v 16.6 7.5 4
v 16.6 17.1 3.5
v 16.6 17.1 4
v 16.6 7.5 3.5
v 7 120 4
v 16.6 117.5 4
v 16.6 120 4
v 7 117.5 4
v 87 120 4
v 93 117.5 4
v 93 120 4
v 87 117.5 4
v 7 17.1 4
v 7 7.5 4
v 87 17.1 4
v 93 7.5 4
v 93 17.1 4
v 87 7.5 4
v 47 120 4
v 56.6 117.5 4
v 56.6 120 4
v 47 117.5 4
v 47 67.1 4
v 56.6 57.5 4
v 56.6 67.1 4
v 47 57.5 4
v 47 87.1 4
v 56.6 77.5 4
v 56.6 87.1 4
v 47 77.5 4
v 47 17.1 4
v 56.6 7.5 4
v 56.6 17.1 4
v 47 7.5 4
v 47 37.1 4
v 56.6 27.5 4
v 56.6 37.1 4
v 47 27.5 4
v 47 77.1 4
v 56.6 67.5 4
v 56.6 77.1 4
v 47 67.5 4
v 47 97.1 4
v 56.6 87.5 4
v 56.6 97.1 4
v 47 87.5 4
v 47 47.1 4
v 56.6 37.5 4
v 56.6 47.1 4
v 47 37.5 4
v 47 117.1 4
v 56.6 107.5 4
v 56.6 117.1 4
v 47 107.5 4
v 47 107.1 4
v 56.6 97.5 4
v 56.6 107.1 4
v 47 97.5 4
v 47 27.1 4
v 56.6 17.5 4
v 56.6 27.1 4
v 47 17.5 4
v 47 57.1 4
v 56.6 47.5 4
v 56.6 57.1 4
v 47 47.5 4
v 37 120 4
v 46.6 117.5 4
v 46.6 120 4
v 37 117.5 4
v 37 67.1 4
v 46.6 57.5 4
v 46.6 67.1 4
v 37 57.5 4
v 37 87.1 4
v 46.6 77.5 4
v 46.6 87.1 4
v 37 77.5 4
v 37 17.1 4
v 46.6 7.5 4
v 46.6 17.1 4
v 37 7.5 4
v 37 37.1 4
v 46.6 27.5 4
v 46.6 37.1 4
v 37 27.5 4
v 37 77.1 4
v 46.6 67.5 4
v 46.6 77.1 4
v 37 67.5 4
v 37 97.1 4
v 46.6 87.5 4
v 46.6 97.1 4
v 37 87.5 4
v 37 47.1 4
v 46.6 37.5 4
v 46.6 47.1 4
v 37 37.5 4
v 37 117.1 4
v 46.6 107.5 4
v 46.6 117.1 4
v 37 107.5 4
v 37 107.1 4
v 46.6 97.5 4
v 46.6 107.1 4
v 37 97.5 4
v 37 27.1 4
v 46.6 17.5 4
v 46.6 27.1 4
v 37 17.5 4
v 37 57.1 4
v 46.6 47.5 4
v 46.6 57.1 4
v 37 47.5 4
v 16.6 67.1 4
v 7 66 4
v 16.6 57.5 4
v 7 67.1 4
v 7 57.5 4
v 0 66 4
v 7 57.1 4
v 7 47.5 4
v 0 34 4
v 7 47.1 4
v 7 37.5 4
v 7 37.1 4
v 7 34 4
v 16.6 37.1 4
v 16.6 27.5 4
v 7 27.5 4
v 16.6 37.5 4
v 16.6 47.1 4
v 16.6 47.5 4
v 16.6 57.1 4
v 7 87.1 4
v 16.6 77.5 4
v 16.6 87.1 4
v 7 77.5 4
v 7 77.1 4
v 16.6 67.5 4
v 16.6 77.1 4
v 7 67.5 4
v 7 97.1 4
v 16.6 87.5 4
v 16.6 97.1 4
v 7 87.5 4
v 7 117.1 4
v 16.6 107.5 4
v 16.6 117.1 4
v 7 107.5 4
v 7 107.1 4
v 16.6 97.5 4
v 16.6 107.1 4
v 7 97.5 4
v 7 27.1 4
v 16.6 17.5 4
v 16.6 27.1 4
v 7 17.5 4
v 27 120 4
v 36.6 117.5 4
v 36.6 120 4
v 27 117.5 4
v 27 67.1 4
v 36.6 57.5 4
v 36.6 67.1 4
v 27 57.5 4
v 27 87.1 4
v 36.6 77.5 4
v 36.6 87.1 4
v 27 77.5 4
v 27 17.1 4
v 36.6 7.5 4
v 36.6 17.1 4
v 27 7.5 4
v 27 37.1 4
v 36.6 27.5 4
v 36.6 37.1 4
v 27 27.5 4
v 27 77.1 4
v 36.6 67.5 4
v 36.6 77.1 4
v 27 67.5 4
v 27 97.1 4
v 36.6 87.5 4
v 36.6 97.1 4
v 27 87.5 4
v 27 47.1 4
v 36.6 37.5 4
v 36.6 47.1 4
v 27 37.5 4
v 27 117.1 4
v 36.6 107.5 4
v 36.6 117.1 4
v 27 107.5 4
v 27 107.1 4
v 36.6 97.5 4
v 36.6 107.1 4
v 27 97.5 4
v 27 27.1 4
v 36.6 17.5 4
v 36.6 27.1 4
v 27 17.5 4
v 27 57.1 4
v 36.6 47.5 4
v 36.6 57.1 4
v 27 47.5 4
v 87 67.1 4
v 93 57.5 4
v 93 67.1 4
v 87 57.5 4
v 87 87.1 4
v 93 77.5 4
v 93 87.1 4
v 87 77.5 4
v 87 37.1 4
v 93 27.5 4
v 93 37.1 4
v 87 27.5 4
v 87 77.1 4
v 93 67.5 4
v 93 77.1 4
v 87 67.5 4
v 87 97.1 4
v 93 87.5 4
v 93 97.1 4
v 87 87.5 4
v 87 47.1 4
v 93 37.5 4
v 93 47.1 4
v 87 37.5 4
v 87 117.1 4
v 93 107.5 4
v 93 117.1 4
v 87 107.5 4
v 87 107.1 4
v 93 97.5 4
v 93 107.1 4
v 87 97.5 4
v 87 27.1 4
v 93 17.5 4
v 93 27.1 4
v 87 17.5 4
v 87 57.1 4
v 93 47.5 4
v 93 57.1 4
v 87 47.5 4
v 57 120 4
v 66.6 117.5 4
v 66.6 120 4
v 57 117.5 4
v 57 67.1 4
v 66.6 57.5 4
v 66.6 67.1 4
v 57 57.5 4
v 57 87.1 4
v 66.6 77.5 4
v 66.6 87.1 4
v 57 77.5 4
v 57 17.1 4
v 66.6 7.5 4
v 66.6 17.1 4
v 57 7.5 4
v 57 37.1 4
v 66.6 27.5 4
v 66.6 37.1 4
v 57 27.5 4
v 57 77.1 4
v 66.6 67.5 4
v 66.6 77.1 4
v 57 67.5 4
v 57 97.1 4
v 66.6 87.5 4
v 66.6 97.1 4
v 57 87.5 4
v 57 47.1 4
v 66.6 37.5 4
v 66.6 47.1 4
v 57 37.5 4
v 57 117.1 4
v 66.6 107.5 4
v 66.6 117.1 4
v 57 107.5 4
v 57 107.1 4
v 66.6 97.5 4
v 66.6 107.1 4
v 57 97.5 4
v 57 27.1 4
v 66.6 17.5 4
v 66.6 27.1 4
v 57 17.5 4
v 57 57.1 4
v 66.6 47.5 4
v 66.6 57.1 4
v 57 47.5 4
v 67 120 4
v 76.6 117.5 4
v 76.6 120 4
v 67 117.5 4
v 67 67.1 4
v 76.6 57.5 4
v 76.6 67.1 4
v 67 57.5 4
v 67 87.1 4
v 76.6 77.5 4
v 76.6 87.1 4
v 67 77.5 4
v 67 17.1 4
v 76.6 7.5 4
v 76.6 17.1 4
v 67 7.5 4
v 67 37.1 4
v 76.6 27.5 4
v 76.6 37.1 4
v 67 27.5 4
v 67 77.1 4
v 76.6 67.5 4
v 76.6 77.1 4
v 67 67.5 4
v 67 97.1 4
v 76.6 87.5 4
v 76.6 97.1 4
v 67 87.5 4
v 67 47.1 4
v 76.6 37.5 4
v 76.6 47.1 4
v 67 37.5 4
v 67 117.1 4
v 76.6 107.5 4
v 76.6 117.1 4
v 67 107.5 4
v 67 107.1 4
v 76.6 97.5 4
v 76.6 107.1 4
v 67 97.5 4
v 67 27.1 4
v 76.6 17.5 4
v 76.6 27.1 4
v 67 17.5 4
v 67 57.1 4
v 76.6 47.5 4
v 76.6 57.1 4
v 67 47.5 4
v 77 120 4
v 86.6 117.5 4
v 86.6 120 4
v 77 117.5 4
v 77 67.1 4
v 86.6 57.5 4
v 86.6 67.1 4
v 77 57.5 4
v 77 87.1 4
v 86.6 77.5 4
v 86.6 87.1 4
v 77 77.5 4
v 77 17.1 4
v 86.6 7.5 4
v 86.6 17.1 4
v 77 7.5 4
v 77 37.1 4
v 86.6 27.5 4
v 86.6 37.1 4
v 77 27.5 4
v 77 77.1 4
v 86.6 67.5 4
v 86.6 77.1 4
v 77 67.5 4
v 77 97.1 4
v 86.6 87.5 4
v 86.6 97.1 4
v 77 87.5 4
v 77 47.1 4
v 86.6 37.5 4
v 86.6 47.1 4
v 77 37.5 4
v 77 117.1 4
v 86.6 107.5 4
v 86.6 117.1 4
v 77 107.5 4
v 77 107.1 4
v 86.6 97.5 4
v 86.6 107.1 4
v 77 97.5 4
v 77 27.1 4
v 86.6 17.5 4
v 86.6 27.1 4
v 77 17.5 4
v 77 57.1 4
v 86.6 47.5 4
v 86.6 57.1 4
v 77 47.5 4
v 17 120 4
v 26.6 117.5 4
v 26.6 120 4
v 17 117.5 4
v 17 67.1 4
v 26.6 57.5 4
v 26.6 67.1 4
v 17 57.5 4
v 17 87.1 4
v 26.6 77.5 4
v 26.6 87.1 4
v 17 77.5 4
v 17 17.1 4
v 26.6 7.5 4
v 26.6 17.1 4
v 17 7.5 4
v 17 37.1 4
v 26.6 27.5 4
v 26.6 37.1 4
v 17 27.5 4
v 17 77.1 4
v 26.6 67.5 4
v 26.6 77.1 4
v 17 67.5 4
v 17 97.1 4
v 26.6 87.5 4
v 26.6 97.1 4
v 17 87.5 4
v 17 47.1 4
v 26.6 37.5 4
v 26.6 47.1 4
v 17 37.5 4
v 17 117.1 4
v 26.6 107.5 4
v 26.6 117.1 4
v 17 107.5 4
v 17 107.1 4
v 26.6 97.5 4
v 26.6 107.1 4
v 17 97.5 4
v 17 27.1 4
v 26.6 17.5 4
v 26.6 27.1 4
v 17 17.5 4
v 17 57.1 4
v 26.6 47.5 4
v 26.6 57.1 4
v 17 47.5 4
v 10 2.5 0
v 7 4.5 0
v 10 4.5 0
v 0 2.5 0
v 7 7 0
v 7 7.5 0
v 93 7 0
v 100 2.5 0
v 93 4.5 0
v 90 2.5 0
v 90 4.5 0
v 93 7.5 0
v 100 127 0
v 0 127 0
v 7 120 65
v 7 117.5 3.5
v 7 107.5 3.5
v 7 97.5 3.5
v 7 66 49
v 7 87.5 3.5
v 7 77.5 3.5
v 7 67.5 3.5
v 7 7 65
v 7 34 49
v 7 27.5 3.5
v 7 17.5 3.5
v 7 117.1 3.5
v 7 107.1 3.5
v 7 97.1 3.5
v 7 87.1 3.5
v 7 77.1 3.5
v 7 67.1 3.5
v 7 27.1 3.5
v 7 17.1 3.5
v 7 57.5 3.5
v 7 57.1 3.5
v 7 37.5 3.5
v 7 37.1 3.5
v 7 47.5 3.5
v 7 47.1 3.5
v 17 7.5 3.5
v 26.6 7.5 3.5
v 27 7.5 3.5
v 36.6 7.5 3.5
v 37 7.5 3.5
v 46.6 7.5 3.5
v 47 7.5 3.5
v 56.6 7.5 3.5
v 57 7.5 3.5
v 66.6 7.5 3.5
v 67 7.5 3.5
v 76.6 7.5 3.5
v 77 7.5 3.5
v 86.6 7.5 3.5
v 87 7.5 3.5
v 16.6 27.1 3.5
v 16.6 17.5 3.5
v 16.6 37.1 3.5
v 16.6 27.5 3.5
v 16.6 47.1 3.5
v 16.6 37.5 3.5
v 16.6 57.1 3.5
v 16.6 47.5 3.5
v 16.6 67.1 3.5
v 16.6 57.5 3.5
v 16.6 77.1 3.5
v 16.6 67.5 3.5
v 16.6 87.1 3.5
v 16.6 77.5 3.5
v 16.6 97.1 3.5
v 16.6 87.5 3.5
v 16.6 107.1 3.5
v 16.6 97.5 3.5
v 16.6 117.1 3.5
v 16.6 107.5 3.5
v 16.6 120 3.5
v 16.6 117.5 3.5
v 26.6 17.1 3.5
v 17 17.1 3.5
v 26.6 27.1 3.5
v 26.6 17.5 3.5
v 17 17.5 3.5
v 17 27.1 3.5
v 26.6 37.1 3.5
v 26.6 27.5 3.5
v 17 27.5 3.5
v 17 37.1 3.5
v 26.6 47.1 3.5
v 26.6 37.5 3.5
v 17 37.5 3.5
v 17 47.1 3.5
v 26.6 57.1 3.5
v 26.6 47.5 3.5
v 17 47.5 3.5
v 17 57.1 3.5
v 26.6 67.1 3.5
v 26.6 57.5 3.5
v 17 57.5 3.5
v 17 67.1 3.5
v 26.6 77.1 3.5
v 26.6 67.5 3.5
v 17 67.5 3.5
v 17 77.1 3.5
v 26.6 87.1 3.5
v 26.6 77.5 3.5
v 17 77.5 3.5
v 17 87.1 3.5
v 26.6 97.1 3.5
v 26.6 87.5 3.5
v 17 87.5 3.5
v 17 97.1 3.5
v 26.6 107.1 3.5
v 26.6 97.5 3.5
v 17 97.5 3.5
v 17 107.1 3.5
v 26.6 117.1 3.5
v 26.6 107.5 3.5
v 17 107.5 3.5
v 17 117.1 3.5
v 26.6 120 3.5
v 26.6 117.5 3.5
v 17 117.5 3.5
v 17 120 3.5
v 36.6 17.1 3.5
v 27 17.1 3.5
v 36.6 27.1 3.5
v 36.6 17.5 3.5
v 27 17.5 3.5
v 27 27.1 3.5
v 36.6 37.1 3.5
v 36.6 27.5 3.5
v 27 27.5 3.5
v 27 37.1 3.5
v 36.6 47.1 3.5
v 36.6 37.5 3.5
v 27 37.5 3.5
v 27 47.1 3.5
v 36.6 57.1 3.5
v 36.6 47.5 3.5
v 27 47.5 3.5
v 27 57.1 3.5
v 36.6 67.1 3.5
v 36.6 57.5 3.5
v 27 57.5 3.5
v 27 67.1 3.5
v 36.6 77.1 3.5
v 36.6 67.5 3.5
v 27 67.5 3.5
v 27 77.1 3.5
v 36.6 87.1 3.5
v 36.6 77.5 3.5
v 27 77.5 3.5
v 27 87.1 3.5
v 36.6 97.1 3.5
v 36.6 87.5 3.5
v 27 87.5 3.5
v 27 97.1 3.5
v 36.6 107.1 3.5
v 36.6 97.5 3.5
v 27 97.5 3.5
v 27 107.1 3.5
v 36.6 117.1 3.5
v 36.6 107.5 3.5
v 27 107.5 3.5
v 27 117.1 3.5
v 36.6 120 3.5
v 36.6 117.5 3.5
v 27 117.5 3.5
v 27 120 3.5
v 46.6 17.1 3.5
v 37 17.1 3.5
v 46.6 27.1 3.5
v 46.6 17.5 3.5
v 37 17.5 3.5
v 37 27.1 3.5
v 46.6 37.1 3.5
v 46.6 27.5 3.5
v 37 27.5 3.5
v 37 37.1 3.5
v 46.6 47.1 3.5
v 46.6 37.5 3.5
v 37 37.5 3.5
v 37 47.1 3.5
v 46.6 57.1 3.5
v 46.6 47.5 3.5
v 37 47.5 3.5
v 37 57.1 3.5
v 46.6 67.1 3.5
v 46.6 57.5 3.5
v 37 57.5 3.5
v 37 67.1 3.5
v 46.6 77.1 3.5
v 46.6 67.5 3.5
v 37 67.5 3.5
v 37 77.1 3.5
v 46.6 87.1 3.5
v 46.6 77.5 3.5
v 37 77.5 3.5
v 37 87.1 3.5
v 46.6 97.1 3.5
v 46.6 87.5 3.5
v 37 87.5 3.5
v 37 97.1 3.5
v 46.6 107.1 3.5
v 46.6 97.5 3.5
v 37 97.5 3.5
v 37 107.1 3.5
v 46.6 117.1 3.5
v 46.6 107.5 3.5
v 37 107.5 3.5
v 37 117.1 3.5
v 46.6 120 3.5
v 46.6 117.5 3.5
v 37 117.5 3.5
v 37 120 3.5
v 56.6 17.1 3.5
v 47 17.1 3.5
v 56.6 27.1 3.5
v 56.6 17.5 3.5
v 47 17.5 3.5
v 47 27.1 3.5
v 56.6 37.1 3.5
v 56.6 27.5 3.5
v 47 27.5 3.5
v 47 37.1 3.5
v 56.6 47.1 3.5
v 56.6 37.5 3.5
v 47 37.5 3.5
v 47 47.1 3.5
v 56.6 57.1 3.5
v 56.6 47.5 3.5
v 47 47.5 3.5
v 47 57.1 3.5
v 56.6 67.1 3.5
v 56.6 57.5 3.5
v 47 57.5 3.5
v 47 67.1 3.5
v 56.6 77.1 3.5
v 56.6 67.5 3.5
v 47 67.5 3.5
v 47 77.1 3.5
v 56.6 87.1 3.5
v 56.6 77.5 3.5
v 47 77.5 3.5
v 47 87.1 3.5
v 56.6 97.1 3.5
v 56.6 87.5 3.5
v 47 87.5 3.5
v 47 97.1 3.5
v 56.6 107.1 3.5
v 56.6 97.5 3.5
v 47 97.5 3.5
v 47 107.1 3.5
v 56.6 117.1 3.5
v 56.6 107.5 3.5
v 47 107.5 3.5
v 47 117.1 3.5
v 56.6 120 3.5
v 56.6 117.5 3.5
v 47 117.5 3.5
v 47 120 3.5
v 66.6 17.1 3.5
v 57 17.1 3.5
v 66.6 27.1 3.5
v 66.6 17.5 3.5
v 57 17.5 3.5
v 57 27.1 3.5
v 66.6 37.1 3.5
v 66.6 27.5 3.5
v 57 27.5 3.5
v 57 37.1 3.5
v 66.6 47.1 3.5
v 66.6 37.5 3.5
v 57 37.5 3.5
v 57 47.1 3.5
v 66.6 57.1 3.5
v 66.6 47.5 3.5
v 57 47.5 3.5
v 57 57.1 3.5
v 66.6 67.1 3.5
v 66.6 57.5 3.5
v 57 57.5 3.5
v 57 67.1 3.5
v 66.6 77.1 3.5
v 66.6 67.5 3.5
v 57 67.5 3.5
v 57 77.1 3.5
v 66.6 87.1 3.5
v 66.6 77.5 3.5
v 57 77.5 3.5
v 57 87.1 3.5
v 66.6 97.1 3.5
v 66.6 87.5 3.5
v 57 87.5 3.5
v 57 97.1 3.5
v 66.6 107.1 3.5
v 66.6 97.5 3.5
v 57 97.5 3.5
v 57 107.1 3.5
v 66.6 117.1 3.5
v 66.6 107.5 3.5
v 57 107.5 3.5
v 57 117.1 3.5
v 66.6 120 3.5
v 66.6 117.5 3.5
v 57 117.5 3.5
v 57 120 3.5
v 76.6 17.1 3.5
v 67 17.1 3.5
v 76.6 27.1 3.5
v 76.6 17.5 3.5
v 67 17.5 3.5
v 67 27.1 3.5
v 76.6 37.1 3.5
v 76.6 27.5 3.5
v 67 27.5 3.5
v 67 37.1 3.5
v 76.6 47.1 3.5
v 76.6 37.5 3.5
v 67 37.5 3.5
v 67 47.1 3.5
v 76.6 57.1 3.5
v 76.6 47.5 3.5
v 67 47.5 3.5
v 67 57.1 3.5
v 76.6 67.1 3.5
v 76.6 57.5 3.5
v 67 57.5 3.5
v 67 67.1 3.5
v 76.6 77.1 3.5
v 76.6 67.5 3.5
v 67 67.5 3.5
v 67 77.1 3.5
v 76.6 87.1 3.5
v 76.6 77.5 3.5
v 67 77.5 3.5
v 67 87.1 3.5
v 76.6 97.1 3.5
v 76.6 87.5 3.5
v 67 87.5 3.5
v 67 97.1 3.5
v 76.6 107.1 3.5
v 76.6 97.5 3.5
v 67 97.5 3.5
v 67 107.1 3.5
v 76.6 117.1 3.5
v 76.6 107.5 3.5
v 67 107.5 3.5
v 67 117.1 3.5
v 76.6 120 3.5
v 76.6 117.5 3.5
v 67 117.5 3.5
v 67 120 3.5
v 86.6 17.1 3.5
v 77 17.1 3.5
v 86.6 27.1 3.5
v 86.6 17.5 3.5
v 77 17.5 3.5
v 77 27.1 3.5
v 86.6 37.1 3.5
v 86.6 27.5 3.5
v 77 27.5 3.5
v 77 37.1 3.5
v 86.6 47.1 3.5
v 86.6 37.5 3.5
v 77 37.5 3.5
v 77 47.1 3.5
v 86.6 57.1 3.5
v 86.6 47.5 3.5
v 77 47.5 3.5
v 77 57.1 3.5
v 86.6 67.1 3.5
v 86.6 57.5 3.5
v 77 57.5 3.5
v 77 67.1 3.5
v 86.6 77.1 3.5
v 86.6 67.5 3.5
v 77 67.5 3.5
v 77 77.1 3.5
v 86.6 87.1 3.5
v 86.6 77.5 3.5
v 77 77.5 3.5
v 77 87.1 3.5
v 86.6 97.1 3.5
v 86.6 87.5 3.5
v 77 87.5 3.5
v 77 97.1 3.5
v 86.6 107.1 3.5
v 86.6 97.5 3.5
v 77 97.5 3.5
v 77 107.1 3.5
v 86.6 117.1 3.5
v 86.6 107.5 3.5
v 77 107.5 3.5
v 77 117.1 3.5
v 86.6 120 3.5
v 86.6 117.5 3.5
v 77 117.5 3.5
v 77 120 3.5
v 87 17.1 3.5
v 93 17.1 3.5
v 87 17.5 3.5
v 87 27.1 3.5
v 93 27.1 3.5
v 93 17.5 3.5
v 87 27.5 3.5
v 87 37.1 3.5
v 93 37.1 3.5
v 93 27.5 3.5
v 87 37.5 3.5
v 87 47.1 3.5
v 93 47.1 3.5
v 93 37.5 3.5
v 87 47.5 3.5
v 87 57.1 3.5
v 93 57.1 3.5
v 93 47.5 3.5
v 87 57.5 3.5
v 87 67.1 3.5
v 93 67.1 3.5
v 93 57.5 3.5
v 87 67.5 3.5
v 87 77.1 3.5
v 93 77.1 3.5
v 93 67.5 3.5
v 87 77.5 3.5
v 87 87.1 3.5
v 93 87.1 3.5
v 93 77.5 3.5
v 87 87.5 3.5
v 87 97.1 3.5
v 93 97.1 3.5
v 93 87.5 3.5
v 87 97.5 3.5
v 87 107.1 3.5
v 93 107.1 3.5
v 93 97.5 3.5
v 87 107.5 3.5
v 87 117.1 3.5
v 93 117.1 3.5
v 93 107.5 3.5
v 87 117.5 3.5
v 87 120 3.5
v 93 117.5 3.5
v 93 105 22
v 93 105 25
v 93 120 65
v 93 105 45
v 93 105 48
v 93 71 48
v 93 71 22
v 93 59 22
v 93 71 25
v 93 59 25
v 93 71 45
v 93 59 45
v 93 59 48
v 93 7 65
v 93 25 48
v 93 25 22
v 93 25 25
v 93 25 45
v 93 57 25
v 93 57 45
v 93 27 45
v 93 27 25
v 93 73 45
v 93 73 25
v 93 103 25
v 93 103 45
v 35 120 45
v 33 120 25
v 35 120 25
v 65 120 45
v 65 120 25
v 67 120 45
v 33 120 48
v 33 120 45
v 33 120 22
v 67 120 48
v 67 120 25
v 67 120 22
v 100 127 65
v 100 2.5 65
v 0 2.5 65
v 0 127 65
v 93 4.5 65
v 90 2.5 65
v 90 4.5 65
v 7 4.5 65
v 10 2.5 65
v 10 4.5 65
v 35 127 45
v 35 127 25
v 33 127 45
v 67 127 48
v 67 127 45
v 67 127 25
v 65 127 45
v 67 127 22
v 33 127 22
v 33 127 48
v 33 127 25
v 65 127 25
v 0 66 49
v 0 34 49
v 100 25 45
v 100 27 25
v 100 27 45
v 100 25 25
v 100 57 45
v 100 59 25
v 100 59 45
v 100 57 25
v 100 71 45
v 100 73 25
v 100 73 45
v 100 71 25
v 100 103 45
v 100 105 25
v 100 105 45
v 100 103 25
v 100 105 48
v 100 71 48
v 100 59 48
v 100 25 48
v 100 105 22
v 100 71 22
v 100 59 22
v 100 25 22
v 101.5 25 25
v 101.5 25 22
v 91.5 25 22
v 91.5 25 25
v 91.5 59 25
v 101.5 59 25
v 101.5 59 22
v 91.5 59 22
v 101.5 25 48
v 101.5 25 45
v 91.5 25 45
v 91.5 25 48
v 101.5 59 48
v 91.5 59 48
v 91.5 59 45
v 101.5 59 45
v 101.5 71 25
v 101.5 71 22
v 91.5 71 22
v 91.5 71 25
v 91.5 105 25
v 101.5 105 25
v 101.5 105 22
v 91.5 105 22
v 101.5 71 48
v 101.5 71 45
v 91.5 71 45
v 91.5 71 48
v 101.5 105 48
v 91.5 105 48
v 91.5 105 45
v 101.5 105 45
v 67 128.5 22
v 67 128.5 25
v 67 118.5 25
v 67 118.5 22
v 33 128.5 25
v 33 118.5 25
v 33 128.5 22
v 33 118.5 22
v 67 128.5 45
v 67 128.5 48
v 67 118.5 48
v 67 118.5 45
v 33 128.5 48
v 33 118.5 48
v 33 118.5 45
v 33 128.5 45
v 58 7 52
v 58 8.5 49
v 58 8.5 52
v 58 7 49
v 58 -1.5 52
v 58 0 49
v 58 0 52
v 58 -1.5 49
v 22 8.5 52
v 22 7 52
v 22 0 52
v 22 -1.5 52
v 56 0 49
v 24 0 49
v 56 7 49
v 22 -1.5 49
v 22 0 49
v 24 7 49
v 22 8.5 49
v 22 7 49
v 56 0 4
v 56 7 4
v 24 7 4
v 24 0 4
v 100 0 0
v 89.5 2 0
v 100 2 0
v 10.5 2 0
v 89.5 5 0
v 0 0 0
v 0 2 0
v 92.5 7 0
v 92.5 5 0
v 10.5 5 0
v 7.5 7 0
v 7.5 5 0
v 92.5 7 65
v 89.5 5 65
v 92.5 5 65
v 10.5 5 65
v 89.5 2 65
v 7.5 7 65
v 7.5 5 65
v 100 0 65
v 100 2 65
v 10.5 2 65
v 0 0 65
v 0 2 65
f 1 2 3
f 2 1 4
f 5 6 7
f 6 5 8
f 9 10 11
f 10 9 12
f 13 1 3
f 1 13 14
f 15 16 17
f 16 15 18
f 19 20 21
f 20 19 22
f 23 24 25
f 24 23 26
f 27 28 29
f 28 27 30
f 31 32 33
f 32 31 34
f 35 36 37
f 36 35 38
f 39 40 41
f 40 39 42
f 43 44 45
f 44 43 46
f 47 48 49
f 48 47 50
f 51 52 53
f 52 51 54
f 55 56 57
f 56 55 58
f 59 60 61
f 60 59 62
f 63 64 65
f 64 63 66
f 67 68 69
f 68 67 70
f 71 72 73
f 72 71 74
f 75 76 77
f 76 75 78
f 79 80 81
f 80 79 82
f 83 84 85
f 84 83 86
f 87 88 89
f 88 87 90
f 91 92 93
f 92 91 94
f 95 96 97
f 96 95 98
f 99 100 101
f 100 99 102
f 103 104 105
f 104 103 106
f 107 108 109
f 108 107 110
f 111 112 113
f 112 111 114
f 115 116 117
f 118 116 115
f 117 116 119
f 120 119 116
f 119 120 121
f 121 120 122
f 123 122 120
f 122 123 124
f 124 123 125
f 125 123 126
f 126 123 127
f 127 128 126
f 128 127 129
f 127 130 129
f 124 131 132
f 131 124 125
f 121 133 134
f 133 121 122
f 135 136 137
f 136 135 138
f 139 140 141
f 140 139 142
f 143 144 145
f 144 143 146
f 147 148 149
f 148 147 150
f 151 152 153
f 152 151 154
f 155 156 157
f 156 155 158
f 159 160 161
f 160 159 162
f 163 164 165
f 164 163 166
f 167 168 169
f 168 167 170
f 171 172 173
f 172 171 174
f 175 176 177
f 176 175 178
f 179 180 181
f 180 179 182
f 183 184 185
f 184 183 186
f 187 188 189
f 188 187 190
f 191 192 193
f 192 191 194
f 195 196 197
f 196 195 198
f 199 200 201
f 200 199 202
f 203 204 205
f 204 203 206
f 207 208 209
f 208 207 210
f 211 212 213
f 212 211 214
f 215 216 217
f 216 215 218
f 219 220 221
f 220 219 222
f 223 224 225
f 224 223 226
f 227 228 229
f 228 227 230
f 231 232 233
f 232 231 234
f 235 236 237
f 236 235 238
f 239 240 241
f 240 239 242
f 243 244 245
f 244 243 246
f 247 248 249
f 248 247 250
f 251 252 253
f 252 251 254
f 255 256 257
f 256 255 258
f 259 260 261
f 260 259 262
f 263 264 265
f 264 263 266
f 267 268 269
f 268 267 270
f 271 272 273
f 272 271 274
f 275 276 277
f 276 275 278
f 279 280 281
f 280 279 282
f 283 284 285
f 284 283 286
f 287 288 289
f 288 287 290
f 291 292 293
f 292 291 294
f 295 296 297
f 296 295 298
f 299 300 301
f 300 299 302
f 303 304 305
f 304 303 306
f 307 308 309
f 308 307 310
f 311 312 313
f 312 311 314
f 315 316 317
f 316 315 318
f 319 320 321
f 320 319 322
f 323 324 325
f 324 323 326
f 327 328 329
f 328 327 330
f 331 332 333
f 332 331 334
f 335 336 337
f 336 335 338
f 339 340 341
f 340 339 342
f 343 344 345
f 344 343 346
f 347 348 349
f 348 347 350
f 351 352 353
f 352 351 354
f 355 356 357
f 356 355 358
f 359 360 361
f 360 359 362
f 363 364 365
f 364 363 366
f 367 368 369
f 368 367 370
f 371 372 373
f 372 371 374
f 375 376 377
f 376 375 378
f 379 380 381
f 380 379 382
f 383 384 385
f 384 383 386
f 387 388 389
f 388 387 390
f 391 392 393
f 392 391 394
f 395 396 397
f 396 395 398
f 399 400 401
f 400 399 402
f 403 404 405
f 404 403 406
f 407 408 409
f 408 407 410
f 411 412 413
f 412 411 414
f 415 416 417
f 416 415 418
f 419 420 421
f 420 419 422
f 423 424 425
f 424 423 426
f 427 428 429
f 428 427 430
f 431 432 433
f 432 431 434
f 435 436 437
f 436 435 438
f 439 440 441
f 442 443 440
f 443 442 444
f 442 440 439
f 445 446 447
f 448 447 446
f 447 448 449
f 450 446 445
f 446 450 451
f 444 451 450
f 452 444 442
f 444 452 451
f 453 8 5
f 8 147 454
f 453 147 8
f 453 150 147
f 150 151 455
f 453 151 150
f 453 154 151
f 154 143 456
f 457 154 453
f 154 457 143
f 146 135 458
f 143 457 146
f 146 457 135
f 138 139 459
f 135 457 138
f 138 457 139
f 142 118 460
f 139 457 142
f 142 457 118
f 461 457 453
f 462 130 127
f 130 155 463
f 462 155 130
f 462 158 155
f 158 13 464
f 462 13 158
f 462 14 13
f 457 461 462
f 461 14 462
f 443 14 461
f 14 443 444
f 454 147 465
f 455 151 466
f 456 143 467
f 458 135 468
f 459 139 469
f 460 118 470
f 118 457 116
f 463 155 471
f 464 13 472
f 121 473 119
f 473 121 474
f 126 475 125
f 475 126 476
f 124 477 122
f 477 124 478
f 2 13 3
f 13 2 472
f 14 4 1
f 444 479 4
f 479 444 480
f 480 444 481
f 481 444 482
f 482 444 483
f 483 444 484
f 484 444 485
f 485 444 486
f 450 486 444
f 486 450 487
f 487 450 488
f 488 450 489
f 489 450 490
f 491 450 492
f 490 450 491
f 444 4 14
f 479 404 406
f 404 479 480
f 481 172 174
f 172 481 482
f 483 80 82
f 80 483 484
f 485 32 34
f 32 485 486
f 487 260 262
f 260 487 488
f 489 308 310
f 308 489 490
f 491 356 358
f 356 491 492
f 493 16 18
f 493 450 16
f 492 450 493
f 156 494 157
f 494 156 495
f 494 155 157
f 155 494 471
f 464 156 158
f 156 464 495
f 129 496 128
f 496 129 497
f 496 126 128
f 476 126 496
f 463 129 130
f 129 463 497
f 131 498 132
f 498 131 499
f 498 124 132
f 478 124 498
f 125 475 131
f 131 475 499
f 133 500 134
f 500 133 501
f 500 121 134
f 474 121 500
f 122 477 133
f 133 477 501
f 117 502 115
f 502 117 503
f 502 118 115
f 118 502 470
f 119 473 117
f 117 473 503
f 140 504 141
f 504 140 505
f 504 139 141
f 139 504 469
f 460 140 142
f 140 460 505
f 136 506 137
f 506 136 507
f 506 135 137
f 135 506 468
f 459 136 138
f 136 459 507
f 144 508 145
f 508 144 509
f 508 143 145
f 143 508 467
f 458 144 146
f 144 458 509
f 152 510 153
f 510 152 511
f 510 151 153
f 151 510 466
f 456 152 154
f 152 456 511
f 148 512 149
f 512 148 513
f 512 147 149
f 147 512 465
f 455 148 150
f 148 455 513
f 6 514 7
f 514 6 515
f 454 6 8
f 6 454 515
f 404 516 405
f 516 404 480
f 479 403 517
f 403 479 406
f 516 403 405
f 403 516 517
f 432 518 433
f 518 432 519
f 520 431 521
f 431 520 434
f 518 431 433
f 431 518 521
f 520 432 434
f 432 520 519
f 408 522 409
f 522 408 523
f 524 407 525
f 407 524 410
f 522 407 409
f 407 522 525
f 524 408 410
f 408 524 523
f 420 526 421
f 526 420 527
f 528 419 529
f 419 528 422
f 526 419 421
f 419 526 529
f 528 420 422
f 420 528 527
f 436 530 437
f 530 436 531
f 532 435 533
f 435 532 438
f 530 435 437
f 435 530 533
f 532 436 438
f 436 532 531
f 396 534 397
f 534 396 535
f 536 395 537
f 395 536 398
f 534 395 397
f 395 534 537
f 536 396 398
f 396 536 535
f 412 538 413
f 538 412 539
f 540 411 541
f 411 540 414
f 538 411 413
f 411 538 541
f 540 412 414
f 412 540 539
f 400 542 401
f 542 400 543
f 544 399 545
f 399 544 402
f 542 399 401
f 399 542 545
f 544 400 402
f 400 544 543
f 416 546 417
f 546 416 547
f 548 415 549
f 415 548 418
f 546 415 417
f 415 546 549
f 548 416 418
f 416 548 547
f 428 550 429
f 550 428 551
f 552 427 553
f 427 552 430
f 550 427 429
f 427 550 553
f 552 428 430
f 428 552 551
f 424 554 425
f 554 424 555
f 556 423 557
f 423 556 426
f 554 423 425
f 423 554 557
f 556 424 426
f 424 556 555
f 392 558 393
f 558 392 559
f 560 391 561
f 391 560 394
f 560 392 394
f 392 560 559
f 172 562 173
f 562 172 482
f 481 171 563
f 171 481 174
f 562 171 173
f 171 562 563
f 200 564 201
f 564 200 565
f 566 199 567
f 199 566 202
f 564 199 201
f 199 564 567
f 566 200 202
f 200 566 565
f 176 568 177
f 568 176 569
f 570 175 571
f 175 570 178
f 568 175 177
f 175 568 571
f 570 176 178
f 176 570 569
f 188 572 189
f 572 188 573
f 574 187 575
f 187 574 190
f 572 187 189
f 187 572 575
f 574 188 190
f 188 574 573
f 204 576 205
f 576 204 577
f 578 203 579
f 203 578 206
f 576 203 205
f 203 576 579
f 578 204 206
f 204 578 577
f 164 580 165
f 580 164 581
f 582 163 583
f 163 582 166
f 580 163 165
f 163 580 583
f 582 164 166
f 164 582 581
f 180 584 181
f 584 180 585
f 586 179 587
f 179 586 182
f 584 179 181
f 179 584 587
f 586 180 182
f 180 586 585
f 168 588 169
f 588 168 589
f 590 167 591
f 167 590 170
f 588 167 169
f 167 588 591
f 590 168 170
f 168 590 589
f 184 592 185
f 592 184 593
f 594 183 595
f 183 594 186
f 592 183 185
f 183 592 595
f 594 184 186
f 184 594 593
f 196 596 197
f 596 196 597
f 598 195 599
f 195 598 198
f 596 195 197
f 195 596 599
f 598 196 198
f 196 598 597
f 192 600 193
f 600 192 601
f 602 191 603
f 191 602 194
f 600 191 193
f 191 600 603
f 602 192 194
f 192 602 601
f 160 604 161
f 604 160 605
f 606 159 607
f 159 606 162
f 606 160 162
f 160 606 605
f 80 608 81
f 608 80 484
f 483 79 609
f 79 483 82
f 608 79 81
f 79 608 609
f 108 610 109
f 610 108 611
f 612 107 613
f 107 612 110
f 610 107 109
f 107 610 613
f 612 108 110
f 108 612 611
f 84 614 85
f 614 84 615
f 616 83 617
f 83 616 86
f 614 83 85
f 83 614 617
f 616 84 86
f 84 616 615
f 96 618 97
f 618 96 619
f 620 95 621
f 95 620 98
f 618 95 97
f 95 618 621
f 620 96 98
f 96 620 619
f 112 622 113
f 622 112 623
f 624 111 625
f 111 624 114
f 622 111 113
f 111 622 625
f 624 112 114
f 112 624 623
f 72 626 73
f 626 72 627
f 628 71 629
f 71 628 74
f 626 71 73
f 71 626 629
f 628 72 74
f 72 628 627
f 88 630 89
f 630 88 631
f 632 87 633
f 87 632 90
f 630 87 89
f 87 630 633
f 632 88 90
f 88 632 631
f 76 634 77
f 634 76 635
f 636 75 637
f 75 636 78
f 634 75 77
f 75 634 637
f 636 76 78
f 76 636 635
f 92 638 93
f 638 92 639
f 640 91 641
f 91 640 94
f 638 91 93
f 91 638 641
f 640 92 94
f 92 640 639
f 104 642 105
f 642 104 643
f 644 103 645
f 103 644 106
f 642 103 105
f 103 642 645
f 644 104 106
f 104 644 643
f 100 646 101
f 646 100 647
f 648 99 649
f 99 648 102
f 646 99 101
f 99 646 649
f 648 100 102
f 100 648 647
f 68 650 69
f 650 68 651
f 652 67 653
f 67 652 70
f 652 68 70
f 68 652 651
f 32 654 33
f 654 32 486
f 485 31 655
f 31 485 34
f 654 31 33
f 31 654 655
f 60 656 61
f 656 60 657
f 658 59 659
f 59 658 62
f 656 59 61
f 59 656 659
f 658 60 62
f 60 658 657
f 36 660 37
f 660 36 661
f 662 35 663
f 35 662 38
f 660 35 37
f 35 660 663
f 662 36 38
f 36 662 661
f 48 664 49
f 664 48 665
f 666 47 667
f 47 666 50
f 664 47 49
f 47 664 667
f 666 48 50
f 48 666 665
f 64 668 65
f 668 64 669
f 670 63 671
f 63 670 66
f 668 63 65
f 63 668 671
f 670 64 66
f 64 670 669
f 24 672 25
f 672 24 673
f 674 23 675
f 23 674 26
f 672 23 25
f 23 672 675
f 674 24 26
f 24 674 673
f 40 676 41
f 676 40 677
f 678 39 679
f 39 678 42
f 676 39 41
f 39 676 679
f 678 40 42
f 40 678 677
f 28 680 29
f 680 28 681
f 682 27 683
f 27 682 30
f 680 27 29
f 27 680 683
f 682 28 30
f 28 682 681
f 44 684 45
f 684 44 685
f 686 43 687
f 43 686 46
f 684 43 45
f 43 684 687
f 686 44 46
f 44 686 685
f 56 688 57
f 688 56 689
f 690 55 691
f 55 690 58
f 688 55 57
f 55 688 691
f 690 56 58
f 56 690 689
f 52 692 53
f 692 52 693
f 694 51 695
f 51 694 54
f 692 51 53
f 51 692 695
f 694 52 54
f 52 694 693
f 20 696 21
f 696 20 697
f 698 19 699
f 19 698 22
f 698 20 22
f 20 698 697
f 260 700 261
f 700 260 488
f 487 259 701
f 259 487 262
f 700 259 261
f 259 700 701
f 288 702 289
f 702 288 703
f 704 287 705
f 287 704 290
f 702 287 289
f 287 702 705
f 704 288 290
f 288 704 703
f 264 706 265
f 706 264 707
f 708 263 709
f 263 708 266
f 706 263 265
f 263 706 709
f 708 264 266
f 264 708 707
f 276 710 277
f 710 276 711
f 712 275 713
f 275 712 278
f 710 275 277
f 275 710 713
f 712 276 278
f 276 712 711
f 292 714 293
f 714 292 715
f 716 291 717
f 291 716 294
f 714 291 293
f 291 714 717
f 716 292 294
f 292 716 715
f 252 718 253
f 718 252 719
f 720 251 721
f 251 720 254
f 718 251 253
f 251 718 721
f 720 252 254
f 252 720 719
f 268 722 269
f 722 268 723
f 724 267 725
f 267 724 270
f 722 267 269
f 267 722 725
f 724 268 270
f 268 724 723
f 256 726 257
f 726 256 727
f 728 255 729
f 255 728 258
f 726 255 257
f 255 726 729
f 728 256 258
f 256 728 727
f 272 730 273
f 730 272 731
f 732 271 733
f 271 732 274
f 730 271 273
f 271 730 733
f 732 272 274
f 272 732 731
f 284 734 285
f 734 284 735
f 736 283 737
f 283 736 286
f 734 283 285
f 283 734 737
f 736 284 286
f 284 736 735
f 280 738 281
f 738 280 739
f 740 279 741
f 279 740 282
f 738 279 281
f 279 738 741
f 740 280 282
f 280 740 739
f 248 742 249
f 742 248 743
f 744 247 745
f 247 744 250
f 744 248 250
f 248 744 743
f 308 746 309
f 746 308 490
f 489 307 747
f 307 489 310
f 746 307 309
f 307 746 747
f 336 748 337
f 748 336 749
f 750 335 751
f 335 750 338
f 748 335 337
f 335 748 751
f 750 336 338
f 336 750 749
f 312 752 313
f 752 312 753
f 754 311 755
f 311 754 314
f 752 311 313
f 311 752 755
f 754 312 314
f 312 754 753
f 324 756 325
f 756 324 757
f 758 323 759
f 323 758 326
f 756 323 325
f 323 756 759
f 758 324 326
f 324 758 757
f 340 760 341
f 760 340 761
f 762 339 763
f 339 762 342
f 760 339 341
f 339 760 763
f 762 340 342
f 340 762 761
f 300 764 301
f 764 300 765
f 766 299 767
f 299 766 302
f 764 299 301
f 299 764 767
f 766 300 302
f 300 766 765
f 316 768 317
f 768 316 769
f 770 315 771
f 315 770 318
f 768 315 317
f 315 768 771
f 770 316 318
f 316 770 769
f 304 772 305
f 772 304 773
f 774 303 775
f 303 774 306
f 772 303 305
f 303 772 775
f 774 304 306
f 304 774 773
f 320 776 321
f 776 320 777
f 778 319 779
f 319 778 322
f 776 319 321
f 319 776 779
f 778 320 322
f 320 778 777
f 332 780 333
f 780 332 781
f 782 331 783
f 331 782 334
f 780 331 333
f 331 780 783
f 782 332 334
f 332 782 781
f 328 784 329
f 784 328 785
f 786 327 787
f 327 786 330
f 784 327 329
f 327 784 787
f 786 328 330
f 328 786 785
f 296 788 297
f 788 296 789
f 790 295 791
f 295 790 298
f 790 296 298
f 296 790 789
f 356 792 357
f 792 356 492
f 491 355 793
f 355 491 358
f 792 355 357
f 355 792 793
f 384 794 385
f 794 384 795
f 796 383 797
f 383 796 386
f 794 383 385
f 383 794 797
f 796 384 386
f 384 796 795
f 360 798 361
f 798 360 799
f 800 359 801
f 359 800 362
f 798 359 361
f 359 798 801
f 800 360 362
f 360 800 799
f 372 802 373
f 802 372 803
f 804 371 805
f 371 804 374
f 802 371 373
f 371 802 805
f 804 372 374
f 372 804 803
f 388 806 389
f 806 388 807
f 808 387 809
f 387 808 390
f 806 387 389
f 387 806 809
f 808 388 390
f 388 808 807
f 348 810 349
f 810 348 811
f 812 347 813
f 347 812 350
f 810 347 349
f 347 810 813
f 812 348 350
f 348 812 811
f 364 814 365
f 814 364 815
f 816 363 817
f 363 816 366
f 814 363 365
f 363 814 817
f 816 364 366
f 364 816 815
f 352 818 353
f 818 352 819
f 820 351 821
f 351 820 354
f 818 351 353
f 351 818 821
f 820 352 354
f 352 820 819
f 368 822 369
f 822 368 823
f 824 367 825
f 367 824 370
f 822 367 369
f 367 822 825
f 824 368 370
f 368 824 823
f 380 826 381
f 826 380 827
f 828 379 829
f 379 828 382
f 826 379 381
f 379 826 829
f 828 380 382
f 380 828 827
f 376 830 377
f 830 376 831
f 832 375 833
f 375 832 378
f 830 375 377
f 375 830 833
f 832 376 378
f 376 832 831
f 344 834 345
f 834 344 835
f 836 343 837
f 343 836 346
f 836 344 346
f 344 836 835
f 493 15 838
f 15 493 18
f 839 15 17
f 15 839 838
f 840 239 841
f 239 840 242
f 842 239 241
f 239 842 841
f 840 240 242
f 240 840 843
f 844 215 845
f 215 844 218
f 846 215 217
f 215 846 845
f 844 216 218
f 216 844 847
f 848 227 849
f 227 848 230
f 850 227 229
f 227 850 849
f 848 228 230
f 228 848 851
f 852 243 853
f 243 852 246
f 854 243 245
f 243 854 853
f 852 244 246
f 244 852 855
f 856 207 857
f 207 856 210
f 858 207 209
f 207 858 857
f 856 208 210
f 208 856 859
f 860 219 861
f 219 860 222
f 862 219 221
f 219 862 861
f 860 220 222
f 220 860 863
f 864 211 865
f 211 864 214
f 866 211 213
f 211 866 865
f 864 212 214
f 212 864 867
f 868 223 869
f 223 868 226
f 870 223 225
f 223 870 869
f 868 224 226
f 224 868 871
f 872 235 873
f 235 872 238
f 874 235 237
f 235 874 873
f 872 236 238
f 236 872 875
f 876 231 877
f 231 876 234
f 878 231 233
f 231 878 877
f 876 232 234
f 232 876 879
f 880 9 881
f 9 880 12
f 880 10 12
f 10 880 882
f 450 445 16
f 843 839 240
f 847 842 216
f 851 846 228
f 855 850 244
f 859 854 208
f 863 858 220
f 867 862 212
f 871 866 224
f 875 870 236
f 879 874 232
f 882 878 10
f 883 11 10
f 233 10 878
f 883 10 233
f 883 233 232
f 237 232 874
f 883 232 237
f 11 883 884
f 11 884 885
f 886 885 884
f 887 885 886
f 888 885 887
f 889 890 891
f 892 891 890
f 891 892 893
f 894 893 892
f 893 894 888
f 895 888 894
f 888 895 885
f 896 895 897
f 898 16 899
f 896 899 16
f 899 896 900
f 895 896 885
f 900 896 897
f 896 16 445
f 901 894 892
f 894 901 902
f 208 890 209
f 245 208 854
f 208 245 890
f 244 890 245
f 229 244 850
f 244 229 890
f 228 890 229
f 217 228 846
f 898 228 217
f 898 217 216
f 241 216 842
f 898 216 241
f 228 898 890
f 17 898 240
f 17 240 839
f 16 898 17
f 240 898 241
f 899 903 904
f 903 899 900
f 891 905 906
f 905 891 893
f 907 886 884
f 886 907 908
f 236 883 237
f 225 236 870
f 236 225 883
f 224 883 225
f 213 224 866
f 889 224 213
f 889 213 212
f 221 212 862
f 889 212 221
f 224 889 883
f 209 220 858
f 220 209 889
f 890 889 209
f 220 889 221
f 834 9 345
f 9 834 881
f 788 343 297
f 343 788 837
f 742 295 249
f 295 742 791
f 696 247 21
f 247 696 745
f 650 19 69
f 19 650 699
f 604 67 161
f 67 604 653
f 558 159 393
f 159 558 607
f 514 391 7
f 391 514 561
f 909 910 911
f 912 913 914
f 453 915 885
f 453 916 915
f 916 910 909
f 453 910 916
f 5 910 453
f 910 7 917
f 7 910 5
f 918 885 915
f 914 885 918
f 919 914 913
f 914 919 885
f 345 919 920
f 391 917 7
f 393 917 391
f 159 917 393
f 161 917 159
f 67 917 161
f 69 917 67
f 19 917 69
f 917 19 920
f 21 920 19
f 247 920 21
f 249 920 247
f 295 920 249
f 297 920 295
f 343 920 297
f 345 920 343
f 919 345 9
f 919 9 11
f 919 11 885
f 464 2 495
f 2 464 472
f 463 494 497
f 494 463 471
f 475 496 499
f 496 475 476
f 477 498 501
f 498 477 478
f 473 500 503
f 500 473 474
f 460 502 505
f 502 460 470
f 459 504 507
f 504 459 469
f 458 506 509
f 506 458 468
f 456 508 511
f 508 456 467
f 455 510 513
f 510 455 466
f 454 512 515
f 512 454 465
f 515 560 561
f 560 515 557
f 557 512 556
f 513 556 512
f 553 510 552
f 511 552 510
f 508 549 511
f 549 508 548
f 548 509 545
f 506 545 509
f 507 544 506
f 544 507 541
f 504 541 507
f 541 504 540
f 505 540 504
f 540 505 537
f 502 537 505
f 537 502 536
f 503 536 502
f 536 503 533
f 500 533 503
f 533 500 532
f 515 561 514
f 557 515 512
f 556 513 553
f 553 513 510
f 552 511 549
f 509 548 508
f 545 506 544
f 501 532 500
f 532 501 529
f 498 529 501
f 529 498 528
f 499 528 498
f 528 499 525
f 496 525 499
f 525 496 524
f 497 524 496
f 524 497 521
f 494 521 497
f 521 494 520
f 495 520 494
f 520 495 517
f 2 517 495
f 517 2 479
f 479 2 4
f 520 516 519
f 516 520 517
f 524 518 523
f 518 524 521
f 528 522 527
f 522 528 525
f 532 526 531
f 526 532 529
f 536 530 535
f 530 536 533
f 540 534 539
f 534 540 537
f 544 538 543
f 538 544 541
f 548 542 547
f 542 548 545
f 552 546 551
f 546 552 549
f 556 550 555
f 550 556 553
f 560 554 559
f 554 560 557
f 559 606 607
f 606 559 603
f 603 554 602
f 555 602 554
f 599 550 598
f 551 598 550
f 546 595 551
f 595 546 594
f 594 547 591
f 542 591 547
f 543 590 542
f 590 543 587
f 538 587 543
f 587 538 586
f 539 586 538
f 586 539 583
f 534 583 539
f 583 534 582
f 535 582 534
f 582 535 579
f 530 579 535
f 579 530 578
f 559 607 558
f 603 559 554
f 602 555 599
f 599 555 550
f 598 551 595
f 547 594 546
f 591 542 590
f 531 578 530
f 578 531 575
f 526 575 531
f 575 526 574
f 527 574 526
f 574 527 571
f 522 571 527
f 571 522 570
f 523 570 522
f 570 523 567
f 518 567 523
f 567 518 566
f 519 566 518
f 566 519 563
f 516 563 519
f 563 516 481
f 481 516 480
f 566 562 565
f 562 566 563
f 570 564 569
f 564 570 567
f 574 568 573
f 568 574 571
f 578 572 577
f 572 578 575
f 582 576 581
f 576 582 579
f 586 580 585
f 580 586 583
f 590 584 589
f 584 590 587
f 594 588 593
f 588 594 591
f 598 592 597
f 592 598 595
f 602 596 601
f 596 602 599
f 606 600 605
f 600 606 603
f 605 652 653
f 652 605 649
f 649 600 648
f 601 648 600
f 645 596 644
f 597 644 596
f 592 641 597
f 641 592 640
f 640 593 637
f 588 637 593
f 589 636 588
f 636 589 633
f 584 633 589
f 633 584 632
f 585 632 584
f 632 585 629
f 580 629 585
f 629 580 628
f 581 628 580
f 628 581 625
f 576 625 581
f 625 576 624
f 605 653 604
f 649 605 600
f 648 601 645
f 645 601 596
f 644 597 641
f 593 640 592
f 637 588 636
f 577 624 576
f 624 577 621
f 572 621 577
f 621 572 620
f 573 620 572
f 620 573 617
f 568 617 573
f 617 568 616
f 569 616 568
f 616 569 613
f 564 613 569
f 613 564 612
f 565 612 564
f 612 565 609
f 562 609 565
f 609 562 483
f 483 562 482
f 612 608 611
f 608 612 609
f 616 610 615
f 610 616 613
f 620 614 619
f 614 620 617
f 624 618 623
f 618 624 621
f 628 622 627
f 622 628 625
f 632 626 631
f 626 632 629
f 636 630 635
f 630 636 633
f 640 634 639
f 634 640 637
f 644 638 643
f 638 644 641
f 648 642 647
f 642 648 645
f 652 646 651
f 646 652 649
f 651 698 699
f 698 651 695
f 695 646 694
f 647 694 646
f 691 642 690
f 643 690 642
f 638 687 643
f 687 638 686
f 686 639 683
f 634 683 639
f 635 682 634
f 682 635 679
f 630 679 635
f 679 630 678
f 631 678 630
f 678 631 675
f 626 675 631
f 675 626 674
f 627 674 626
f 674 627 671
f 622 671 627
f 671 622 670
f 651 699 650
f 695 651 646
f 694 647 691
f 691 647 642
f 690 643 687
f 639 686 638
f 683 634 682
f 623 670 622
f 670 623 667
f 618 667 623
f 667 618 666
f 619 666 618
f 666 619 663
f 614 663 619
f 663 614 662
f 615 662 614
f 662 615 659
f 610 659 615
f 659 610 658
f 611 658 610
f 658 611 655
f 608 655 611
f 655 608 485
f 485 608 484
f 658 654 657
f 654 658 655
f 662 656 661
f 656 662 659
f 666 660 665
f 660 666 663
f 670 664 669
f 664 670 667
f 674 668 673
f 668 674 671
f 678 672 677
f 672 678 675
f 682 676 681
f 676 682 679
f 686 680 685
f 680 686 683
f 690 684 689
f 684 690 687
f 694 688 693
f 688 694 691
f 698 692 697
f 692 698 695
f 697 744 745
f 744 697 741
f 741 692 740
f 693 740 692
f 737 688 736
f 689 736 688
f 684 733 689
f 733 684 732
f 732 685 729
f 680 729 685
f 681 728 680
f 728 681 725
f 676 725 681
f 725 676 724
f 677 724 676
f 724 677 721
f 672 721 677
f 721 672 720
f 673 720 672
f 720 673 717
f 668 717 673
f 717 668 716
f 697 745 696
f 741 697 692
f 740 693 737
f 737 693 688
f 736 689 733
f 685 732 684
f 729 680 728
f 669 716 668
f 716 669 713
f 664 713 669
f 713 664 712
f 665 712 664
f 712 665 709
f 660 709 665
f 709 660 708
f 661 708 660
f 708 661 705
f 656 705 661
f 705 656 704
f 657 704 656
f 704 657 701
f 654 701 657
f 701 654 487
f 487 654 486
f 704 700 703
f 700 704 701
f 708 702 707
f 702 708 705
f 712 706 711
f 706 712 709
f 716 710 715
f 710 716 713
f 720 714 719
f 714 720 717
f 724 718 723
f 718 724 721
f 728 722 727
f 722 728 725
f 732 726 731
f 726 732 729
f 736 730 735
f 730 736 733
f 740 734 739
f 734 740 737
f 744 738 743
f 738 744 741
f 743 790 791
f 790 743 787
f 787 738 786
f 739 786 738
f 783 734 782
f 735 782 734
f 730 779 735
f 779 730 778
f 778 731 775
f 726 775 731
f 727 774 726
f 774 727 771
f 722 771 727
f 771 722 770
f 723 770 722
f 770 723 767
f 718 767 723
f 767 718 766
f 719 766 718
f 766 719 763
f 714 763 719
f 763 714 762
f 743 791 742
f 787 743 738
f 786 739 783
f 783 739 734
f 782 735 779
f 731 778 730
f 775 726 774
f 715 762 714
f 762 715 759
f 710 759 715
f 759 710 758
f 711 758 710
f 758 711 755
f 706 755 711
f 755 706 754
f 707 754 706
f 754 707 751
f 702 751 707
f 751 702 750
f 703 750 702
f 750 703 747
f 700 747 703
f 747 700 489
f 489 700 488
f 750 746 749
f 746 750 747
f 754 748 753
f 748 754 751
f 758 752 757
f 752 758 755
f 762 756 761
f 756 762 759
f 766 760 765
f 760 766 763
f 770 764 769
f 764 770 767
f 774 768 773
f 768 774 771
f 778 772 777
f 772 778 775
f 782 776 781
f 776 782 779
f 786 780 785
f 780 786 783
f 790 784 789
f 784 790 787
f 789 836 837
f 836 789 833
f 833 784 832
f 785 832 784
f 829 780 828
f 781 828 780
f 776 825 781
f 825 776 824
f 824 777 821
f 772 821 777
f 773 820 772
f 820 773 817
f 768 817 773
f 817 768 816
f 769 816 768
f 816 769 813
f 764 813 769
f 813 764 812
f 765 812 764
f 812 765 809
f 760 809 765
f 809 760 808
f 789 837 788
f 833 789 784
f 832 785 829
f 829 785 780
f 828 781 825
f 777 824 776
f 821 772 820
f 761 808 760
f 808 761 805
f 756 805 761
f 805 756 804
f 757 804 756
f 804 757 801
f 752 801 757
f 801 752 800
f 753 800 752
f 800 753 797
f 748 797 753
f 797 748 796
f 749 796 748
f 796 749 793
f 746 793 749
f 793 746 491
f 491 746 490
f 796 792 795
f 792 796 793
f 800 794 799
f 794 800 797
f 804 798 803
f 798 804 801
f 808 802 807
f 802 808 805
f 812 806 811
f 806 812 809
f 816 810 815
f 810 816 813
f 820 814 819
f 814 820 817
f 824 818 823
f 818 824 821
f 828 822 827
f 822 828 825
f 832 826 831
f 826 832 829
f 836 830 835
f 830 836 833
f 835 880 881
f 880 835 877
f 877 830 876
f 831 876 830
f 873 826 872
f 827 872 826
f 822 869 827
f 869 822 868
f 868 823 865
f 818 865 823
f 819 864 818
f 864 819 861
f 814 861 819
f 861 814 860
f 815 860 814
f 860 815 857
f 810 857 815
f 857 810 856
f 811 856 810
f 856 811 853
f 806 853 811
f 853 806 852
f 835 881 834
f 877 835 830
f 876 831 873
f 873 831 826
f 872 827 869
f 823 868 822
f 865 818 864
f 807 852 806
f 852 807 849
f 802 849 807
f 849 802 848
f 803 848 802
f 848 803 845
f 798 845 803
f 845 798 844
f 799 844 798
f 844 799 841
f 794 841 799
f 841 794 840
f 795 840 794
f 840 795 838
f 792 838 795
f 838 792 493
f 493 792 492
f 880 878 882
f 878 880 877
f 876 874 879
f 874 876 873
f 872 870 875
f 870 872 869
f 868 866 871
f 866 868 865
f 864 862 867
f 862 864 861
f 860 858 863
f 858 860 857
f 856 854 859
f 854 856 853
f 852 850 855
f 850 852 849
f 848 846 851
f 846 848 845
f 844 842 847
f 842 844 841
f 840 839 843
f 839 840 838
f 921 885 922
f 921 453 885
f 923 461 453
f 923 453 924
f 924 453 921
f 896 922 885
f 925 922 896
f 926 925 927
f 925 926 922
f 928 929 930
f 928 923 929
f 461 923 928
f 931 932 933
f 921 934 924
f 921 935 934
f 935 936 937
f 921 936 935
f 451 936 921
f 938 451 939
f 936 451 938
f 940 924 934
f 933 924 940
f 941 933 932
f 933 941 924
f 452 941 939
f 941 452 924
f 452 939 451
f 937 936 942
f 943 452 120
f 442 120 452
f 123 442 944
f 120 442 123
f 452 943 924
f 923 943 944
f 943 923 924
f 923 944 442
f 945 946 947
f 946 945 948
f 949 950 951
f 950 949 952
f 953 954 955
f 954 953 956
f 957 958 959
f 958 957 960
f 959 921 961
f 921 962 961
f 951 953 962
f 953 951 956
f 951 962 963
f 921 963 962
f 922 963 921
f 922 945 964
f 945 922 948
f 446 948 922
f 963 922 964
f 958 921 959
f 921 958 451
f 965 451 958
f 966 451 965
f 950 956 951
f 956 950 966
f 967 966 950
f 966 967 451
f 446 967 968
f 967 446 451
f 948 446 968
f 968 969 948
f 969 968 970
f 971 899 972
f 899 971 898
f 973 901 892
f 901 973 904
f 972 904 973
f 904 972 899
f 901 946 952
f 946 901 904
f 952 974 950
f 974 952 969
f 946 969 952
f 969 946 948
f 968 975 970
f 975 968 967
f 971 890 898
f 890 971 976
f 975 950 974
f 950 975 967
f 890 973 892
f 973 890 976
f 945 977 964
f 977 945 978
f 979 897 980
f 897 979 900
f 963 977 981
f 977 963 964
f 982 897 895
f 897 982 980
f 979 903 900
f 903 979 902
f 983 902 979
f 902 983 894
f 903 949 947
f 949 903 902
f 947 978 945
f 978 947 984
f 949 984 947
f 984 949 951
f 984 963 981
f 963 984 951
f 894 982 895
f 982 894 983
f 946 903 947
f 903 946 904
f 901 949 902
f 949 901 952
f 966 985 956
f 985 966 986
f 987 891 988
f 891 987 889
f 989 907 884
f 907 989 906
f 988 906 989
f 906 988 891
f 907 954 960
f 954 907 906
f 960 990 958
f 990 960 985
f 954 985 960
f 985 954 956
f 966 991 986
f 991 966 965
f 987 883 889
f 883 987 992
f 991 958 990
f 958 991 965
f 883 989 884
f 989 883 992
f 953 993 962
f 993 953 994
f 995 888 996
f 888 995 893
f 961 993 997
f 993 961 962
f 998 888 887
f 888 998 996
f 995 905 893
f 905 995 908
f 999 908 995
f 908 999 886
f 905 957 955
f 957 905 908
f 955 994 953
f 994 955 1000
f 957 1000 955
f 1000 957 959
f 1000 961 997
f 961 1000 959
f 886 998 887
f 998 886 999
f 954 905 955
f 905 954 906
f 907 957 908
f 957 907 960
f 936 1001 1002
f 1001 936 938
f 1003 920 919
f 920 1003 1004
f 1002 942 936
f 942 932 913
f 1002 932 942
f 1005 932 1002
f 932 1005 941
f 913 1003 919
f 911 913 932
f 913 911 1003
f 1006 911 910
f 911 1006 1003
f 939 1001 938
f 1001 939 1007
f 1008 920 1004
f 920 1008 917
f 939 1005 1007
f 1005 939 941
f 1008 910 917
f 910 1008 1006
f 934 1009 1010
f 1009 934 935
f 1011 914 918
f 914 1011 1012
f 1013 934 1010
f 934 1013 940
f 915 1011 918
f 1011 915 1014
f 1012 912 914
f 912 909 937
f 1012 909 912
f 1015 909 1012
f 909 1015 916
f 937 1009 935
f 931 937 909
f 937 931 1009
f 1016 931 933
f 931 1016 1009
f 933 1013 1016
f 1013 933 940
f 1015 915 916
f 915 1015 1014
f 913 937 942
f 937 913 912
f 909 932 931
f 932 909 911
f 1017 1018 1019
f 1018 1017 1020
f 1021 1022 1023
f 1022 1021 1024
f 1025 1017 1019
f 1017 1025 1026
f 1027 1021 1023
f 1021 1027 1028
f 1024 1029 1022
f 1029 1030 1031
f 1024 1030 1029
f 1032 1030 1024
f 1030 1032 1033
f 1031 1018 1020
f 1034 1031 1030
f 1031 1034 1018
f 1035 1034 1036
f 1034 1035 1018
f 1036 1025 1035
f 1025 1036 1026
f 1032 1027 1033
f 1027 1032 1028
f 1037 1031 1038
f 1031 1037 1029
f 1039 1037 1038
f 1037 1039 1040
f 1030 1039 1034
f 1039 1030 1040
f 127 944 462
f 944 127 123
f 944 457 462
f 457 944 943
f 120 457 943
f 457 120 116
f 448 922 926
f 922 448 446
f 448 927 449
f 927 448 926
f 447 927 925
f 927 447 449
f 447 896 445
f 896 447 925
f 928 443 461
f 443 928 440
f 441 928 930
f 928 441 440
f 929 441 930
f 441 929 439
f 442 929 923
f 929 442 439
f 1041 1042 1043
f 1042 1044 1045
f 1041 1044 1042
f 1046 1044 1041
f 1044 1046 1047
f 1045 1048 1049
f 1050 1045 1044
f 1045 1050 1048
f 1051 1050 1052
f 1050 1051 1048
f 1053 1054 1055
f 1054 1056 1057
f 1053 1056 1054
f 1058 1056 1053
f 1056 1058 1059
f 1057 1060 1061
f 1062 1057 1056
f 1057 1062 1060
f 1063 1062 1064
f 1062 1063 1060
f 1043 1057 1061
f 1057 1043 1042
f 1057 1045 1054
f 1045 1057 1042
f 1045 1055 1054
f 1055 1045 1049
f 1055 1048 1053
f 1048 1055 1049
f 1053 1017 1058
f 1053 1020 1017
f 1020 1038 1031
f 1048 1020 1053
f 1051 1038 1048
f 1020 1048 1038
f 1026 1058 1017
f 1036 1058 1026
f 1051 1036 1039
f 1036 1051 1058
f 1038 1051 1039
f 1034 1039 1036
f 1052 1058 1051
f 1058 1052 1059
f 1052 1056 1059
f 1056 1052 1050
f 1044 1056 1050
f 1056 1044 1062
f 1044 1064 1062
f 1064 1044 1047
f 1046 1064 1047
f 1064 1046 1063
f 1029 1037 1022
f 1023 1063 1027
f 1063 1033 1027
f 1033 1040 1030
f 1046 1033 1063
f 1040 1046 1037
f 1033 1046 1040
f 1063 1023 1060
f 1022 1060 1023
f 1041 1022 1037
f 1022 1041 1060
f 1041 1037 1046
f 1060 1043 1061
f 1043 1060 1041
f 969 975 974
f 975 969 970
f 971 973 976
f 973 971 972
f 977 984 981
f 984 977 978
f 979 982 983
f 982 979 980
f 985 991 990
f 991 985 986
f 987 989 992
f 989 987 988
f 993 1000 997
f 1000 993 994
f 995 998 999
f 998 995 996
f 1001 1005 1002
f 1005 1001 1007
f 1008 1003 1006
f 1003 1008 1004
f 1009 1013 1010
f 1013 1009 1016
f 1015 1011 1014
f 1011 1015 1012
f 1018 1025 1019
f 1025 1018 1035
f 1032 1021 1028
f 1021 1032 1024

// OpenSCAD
use <building.scad>

building(dims = b3Dims, windows = b3Windows, doors = b3Doors);

/* Dims is a vector holding dimensions of the building 
 * [X, Y, height, wall thickness, floor/roof thickness].
 */
b3Dims = [100, // xdim
	     127, // ydim
	     65, // height
	     7, // wall thickness
	     4]; // floor/roof thickness

/* Windows is a 3D array holding translate : rotate pairs, one per window.
 * 
 */
b3Windows = [[[93, 42, 0], [0,0,-90]],
		    [[93, 88, 0], [0,0,-90]],
		    [[50,120,0], [0,0,0]],
		   ];

/* Doors is a 3D array holding translate : rotate : boolean tuples, one per
 * door.
 * Booleans are [ doFrame, unused, unused ].
 */
b3Doors = [[[0, 50, 0], [0,0,-90], [0,0,0]],
		  [[40,0,0], [0,0,0], [1,0,0]],
          ];
